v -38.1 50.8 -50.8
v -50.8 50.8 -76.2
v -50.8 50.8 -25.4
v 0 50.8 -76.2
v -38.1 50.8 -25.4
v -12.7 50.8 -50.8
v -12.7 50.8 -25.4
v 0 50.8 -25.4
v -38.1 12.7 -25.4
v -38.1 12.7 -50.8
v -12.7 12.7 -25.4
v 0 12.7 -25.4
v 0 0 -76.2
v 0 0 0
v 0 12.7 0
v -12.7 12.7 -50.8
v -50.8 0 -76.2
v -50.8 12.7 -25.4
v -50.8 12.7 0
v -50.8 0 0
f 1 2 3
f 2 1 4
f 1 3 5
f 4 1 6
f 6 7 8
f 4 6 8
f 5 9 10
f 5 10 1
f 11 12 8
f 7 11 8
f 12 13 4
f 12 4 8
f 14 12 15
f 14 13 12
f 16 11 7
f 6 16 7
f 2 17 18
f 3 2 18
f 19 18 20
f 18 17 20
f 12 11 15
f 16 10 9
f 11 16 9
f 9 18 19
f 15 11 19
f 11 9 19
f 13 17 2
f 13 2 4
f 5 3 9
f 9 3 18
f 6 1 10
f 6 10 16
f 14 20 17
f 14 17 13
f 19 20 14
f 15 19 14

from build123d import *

# Parameters (mm, degrees)
F0_W     = 50.8
F0_H     = 76.2
F1_DEPTH = 50.8
F2_W     = 25.4
F2_H     = 38.1
F3_DEPTH = 50.8
F4_W     = 38.1
F4_H     = 25.4
F5_DEPTH = 25.4
F6_W     = 38.1
F6_H     = 25.4
F7_DEPTH = 25.4


with BuildPart() as f1:
    # F0 (on Front) → F1 (new body)
    with BuildSketch(Plane.XZ):
        with Locations((-25.4, -38.1)):
            Rectangle(F0_W, F0_H)
    extrude(amount=-F1_DEPTH)

    # F2 (on face) → F3 (cut)
    with BuildSketch(Plane.XY):
        with Locations((-25.4, 31.75)):
            Rectangle(F2_W, F2_H)
    extrude(amount=-F3_DEPTH, mode=Mode.SUBTRACT)

    # F4 (on face) → F5 (cut)
    with BuildSketch(Plane(origin=(-50.8, 0, 0), x_dir=(0, -1, 0), z_dir=(-1, 0, 0))):
        with Locations((-31.75, -12.7)):
            Rectangle(F4_W, F4_H)
    extrude(amount=-F5_DEPTH, mode=Mode.SUBTRACT)

    # F6 (on face) → F7 (cut)
    with BuildSketch(Plane.YZ):
        with Locations((31.75, -12.7)):
            Rectangle(F6_W, F6_H)
    extrude(amount=-F7_DEPTH, mode=Mode.SUBTRACT)


solid = f1.part
